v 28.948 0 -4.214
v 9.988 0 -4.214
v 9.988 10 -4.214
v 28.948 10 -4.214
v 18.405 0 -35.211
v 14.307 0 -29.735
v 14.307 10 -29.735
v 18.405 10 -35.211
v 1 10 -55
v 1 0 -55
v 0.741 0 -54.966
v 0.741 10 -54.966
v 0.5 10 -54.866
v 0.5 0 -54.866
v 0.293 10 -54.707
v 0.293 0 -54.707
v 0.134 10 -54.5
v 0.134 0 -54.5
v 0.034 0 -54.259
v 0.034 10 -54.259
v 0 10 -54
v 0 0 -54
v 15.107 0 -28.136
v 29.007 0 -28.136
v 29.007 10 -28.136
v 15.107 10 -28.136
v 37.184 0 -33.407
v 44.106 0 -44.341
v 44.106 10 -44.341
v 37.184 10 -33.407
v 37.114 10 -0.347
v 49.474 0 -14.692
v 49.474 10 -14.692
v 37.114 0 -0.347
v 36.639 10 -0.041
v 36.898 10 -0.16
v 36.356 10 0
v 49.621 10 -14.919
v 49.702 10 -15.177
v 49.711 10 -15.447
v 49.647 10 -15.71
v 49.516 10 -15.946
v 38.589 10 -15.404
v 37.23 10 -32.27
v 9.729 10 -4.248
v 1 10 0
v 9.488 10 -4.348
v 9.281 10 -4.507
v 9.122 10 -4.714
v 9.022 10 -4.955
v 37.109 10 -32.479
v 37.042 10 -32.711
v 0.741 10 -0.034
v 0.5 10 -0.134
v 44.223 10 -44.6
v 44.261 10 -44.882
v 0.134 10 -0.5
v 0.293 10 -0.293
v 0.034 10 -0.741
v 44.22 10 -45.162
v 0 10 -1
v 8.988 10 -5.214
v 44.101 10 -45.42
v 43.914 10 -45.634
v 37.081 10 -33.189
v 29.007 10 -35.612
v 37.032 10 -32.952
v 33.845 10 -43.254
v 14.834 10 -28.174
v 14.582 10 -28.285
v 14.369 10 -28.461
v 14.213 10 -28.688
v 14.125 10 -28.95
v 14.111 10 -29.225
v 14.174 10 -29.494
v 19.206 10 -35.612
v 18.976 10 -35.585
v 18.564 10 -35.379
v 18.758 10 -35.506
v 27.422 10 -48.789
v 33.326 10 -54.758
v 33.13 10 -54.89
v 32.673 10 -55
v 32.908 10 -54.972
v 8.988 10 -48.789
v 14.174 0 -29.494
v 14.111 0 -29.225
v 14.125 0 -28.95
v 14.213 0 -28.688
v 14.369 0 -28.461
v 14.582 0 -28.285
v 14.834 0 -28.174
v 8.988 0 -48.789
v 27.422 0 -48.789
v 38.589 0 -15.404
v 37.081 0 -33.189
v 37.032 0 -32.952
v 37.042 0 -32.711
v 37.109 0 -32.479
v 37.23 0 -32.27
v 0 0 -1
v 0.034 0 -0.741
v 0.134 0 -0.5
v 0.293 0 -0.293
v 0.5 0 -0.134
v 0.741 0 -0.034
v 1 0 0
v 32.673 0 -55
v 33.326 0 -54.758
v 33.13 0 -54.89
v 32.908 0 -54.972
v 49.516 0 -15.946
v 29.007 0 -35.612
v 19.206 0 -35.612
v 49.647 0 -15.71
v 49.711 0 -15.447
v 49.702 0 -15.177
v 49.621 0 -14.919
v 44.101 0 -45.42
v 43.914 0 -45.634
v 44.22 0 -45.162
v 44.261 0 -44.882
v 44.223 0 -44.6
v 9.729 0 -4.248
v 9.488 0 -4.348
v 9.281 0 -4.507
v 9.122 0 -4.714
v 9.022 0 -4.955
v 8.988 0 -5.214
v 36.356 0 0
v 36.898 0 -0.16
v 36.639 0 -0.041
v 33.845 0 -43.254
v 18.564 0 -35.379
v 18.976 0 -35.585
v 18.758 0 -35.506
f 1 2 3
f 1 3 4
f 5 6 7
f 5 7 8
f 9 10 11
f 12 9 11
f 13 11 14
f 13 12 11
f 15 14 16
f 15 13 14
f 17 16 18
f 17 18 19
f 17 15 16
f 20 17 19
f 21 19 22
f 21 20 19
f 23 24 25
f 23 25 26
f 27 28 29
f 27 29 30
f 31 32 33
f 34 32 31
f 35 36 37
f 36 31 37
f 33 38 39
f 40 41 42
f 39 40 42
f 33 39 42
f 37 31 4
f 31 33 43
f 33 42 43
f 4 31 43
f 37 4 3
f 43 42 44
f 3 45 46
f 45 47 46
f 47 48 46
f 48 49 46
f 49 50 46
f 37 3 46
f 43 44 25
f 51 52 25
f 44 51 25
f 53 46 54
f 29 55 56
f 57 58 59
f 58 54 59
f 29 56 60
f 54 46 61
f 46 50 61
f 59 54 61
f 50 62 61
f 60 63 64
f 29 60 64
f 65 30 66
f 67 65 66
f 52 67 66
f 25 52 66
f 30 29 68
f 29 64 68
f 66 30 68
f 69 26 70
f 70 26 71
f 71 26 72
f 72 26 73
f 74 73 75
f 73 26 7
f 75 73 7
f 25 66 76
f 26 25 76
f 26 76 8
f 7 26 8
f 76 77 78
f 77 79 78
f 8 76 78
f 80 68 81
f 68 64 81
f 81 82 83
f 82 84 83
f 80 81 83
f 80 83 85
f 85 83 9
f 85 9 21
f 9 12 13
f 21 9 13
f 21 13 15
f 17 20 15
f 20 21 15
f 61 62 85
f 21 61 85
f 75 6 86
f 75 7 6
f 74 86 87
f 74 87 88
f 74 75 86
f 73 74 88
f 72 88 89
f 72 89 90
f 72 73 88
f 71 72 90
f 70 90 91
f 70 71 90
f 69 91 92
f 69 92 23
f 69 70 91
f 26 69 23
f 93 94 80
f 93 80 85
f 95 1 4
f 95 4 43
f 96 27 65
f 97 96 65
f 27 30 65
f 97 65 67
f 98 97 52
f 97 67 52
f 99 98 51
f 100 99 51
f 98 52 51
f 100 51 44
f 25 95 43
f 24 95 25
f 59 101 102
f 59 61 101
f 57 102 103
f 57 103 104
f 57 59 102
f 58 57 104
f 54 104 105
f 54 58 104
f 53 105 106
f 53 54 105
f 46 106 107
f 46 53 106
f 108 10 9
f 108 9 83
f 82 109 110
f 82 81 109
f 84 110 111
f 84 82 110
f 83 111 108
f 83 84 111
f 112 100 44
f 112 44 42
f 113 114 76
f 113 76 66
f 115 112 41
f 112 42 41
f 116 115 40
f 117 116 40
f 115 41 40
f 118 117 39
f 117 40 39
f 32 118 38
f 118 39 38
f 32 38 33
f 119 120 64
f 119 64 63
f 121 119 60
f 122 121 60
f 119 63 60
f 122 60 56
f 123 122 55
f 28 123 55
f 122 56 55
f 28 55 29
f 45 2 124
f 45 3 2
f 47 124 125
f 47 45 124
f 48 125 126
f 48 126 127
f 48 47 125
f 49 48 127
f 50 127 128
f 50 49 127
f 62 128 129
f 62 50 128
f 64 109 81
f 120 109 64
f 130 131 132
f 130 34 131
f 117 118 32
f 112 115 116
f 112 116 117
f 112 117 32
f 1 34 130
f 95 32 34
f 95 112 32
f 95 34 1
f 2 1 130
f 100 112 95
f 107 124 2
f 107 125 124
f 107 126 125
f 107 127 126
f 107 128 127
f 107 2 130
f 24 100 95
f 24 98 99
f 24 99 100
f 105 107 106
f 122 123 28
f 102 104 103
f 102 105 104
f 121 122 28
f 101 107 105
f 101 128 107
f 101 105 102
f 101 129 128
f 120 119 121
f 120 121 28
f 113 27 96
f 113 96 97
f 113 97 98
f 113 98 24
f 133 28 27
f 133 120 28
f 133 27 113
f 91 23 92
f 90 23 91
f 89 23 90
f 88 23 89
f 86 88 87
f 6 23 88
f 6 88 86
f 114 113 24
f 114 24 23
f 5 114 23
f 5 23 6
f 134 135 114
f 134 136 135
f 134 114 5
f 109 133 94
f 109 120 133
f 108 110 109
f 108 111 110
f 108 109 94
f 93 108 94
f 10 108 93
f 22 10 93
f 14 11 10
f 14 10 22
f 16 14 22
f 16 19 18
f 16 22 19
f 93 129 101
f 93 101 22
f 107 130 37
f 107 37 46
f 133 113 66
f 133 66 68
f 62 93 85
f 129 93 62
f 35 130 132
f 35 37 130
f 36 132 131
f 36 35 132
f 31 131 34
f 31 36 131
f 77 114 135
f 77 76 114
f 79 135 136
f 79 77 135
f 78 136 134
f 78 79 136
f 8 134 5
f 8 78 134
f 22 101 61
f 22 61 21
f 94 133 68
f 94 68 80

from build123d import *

# Parameters (mm, degrees)
BOSS_EXTRUDE1_DEPTH = 10
FILLET1_R           = 1


with BuildPart() as part:
    # Sketch1 → Boss-Extrude1 (new body)
    with BuildSketch(Plane(origin=(0, 0, 0), x_dir=(1, 0, 0), z_dir=(0, 1, 0))):
        Polygon((33.044354839, 55), (44.567912368, 45.070610508), (36.814516129, 32.822580645), (50, 15.302419355), (36.814516129, 0), (0, 0), (0, 55), align=None)
        Polygon((8.987912628, 48.788514125), (8.987912628, 4.213709677), (28.947590047, 4.213709677), (38.589466872, 15.403594249), (29.007221014, 28.135966803), (13.109814871, 28.135966803), (18.704963548, 35.611652929), (29.007221014, 35.611652929), (33.844976201, 43.25384845), (27.421717413, 48.788514125), align=None, mode=Mode.SUBTRACT)
    extrude(amount=BOSS_EXTRUDE1_DEPTH)

    # Fillet1
    fillet1_edges = [part.edges().sort_by_distance(p)[0] for p in [
        (0, 5, -55),
        (33.044354839, 5, -55),
        (44.567912368, 5, -45.070610508),
        (36.814516129, 5, -32.822580645),
        (50, 5, -15.302419355),
        (36.814516129, 5, 0),
        (0, 5, 0),
        (8.987912628, 5, -4.213709677),
        (13.109814871, 5, -28.135966803),
        (18.704963548, 5, -35.611652929),
    ]]
    fillet(fillet1_edges, radius=FILLET1_R)


solid = part.part
